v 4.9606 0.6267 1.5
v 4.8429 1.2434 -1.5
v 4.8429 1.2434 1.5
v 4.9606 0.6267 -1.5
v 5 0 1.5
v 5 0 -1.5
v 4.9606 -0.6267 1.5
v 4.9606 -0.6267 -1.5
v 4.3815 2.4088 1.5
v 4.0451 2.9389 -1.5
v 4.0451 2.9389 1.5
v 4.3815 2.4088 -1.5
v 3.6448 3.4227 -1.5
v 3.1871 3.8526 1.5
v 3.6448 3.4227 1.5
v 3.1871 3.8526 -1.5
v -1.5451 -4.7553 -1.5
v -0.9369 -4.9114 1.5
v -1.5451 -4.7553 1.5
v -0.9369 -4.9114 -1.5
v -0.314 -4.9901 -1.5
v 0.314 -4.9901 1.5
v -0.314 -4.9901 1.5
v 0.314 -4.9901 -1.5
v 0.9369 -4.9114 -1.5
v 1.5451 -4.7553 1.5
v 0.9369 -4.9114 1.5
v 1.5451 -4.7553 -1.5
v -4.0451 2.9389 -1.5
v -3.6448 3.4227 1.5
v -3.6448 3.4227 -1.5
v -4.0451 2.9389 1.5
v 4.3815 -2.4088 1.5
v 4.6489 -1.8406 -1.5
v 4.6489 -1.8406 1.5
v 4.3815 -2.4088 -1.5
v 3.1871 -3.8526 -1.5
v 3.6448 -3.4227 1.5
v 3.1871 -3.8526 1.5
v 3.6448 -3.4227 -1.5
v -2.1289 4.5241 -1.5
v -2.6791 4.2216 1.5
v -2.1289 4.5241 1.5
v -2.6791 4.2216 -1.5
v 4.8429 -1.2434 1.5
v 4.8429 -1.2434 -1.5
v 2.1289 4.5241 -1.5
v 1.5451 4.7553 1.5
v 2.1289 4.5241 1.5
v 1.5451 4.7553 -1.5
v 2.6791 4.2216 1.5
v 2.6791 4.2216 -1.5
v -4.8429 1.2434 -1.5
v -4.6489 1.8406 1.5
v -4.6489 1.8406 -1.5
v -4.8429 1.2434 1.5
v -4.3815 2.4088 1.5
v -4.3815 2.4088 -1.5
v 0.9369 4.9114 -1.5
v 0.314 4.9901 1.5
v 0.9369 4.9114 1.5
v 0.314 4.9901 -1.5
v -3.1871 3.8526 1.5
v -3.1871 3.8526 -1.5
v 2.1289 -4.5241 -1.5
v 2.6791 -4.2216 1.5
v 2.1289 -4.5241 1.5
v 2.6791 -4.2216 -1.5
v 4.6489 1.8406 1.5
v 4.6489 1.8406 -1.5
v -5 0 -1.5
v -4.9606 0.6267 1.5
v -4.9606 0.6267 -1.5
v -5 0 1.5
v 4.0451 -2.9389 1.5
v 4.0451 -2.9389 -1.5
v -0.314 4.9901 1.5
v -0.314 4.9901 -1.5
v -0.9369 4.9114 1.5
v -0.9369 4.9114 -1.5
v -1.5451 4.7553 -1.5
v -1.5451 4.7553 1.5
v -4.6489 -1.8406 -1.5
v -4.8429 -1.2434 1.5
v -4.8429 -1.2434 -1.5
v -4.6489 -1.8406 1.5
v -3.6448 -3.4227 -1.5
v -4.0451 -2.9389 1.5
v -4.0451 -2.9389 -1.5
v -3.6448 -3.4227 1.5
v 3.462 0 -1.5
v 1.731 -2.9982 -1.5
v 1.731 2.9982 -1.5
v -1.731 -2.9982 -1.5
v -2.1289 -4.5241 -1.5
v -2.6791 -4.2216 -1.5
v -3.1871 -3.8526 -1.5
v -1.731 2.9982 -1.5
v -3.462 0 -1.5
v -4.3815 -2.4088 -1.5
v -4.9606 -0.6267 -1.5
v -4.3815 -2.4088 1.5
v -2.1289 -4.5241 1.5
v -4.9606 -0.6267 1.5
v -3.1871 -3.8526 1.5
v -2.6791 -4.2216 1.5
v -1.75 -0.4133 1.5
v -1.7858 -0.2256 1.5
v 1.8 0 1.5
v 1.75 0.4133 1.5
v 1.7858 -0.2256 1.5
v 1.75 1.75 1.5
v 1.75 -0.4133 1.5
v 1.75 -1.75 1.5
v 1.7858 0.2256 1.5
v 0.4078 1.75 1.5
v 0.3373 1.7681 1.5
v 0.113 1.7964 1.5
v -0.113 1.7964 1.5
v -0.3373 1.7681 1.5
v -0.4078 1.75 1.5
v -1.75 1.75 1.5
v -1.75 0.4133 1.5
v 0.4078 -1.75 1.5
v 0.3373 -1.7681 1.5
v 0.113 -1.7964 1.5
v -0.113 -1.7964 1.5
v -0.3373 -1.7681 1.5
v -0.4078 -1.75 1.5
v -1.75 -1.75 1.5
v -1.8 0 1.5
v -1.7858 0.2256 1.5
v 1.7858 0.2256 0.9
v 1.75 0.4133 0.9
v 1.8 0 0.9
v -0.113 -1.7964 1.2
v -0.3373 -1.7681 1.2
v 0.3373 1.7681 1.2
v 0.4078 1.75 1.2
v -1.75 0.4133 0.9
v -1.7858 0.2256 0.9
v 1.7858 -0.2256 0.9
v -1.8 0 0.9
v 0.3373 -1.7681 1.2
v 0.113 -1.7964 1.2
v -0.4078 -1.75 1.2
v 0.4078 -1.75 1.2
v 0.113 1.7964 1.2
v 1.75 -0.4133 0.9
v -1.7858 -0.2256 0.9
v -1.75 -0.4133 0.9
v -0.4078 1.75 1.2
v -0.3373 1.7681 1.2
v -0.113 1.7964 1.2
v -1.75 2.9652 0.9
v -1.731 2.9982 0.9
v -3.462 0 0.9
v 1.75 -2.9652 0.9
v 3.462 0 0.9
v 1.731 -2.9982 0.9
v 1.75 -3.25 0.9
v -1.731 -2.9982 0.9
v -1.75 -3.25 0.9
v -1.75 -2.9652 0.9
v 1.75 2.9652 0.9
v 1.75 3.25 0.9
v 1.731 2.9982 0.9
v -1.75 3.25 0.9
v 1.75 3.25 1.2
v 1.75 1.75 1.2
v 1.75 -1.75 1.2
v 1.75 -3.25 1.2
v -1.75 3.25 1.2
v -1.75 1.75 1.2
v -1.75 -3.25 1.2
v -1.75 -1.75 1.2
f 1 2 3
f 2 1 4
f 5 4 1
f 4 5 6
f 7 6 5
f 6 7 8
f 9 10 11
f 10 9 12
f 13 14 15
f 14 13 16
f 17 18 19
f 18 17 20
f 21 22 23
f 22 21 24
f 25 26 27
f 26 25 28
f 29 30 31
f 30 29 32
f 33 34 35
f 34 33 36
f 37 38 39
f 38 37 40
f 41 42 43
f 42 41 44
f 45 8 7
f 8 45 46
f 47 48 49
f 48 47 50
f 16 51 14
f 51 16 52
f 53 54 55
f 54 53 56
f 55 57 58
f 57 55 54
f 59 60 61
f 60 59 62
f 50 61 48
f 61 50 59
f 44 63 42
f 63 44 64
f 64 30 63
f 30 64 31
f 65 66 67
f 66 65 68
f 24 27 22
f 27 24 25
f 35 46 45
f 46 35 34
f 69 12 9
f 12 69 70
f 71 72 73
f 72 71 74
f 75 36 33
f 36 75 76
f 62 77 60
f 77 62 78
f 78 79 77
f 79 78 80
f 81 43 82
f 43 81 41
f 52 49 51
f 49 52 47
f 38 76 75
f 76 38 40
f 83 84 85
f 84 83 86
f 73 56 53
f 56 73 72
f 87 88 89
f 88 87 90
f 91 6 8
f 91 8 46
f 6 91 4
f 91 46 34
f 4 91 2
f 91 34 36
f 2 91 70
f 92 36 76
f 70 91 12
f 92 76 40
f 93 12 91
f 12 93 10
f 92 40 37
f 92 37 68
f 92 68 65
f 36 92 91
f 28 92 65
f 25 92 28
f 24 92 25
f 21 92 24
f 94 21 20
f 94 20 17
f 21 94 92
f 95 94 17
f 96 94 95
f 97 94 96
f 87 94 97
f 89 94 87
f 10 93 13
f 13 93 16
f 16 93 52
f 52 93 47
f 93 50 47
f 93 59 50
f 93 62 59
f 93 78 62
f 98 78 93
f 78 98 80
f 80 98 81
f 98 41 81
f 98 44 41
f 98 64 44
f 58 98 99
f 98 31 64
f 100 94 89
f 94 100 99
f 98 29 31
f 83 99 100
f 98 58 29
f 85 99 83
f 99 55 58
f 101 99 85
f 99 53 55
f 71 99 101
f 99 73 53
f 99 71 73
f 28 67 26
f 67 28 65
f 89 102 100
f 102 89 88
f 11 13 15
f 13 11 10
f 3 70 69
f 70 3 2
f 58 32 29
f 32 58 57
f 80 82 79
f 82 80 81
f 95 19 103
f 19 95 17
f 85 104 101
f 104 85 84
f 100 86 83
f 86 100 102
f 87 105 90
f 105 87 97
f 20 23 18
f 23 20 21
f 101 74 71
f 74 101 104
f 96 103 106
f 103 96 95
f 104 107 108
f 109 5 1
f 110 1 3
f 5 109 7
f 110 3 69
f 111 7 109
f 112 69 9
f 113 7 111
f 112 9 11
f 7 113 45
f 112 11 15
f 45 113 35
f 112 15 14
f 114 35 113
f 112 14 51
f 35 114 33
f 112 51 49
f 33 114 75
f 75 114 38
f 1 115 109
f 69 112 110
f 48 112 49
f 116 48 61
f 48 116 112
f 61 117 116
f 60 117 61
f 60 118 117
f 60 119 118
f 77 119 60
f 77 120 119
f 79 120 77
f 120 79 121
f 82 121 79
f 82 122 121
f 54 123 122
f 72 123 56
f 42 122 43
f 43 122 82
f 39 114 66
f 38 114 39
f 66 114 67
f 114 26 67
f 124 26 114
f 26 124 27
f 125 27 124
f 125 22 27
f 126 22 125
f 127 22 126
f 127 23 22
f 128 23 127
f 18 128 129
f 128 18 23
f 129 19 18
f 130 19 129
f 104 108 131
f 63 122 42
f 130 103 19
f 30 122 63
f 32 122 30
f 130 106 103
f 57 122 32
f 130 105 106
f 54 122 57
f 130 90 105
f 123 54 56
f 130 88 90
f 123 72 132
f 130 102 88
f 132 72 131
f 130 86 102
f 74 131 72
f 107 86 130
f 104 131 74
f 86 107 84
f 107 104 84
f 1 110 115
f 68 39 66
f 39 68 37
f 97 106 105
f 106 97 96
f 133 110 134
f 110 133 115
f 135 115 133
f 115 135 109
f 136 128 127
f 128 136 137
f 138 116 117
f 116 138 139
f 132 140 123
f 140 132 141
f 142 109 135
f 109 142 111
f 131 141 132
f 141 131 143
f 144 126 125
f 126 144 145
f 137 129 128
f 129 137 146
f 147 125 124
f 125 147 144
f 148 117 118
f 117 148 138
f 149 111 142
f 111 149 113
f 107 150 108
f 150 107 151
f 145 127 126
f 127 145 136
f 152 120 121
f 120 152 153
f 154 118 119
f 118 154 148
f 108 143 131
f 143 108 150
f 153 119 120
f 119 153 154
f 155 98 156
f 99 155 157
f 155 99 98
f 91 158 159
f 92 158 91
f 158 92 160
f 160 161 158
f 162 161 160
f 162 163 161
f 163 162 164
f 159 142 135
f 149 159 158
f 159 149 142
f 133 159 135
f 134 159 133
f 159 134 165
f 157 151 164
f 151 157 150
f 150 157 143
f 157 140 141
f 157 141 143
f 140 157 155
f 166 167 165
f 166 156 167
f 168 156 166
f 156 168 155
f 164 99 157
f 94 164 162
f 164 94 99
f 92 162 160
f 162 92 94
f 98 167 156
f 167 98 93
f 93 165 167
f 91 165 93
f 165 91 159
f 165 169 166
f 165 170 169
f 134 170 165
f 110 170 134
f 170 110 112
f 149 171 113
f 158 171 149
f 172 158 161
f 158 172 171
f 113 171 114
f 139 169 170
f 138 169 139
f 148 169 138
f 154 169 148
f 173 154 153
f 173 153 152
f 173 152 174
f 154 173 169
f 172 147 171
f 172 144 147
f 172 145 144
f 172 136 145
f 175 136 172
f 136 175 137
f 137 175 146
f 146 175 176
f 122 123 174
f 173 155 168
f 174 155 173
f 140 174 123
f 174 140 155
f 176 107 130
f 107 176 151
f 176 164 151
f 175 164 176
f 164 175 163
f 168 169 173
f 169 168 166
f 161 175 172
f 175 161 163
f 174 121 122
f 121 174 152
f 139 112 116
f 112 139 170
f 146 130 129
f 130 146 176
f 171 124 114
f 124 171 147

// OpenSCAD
$fn = 50;


difference() {
	union() {
		translate(v = [0, 0, -1.5000000000]) {
			rotate(a = [0, 0, 0]) {
				cylinder(h = 3, r = 5.0000000000);
			}
		}
		translate(v = [0, 0, -1.5000000000]) {
			rotate(a = [0, 0, 0]) {
				cylinder(h = 3, r = 2.8500000000);
			}
		}
	}
	union() {
		translate(v = [0, 0, -125.0000000000]) {
			rotate(a = [0, 0, 0]) {
				cylinder(h = 250, r = 1.8000000000);
			}
		}
		translate(v = [0, 0, -2.1000000000]) {
			rotate(a = [0, 0, 0]) {
				#translate(v = [0, 0, 0]) {
					rotate(a = [0, 0, 0]) {
						linear_extrude(height = 3) {
							polygon(points = [[3.4620000000, 0.0000000000], [1.7310000000, 2.9981799479], [-1.7310000000, 2.9981799479], [-3.4620000000, 0.0000000000], [-1.7310000000, -2.9981799479], [1.7310000000, -2.9981799479]]);
						}
					}
				}
			}
		}
		#translate(v = [-1.7500000000, -3.2500000000, 0.9000000000]) {
			rotate(a = [0, 0, 0]) {
				cube(size = [3.5000000000, 6.5000000000, 0.3000000000]);
			}
		}
		#translate(v = [-1.7500000000, -1.7500000000, 1.2000000000]) {
			rotate(a = [0, 0, 0]) {
				cube(size = [3.5000000000, 3.5000000000, 0.3000000000]);
			}
		}
		#translate(v = [-1.7500000000, -3.2500000000, -2.4000000000]) {
			rotate(a = [0, 0, 0]) {
				cube(size = [3.5000000000, 6.5000000000, 0.3000000000]);
			}
		}
		#translate(v = [-1.7500000000, -1.7500000000, -2.7000000000]) {
			rotate(a = [0, 0, 0]) {
				cube(size = [3.5000000000, 3.5000000000, 0.3000000000]);
			}
		}
	}
}
